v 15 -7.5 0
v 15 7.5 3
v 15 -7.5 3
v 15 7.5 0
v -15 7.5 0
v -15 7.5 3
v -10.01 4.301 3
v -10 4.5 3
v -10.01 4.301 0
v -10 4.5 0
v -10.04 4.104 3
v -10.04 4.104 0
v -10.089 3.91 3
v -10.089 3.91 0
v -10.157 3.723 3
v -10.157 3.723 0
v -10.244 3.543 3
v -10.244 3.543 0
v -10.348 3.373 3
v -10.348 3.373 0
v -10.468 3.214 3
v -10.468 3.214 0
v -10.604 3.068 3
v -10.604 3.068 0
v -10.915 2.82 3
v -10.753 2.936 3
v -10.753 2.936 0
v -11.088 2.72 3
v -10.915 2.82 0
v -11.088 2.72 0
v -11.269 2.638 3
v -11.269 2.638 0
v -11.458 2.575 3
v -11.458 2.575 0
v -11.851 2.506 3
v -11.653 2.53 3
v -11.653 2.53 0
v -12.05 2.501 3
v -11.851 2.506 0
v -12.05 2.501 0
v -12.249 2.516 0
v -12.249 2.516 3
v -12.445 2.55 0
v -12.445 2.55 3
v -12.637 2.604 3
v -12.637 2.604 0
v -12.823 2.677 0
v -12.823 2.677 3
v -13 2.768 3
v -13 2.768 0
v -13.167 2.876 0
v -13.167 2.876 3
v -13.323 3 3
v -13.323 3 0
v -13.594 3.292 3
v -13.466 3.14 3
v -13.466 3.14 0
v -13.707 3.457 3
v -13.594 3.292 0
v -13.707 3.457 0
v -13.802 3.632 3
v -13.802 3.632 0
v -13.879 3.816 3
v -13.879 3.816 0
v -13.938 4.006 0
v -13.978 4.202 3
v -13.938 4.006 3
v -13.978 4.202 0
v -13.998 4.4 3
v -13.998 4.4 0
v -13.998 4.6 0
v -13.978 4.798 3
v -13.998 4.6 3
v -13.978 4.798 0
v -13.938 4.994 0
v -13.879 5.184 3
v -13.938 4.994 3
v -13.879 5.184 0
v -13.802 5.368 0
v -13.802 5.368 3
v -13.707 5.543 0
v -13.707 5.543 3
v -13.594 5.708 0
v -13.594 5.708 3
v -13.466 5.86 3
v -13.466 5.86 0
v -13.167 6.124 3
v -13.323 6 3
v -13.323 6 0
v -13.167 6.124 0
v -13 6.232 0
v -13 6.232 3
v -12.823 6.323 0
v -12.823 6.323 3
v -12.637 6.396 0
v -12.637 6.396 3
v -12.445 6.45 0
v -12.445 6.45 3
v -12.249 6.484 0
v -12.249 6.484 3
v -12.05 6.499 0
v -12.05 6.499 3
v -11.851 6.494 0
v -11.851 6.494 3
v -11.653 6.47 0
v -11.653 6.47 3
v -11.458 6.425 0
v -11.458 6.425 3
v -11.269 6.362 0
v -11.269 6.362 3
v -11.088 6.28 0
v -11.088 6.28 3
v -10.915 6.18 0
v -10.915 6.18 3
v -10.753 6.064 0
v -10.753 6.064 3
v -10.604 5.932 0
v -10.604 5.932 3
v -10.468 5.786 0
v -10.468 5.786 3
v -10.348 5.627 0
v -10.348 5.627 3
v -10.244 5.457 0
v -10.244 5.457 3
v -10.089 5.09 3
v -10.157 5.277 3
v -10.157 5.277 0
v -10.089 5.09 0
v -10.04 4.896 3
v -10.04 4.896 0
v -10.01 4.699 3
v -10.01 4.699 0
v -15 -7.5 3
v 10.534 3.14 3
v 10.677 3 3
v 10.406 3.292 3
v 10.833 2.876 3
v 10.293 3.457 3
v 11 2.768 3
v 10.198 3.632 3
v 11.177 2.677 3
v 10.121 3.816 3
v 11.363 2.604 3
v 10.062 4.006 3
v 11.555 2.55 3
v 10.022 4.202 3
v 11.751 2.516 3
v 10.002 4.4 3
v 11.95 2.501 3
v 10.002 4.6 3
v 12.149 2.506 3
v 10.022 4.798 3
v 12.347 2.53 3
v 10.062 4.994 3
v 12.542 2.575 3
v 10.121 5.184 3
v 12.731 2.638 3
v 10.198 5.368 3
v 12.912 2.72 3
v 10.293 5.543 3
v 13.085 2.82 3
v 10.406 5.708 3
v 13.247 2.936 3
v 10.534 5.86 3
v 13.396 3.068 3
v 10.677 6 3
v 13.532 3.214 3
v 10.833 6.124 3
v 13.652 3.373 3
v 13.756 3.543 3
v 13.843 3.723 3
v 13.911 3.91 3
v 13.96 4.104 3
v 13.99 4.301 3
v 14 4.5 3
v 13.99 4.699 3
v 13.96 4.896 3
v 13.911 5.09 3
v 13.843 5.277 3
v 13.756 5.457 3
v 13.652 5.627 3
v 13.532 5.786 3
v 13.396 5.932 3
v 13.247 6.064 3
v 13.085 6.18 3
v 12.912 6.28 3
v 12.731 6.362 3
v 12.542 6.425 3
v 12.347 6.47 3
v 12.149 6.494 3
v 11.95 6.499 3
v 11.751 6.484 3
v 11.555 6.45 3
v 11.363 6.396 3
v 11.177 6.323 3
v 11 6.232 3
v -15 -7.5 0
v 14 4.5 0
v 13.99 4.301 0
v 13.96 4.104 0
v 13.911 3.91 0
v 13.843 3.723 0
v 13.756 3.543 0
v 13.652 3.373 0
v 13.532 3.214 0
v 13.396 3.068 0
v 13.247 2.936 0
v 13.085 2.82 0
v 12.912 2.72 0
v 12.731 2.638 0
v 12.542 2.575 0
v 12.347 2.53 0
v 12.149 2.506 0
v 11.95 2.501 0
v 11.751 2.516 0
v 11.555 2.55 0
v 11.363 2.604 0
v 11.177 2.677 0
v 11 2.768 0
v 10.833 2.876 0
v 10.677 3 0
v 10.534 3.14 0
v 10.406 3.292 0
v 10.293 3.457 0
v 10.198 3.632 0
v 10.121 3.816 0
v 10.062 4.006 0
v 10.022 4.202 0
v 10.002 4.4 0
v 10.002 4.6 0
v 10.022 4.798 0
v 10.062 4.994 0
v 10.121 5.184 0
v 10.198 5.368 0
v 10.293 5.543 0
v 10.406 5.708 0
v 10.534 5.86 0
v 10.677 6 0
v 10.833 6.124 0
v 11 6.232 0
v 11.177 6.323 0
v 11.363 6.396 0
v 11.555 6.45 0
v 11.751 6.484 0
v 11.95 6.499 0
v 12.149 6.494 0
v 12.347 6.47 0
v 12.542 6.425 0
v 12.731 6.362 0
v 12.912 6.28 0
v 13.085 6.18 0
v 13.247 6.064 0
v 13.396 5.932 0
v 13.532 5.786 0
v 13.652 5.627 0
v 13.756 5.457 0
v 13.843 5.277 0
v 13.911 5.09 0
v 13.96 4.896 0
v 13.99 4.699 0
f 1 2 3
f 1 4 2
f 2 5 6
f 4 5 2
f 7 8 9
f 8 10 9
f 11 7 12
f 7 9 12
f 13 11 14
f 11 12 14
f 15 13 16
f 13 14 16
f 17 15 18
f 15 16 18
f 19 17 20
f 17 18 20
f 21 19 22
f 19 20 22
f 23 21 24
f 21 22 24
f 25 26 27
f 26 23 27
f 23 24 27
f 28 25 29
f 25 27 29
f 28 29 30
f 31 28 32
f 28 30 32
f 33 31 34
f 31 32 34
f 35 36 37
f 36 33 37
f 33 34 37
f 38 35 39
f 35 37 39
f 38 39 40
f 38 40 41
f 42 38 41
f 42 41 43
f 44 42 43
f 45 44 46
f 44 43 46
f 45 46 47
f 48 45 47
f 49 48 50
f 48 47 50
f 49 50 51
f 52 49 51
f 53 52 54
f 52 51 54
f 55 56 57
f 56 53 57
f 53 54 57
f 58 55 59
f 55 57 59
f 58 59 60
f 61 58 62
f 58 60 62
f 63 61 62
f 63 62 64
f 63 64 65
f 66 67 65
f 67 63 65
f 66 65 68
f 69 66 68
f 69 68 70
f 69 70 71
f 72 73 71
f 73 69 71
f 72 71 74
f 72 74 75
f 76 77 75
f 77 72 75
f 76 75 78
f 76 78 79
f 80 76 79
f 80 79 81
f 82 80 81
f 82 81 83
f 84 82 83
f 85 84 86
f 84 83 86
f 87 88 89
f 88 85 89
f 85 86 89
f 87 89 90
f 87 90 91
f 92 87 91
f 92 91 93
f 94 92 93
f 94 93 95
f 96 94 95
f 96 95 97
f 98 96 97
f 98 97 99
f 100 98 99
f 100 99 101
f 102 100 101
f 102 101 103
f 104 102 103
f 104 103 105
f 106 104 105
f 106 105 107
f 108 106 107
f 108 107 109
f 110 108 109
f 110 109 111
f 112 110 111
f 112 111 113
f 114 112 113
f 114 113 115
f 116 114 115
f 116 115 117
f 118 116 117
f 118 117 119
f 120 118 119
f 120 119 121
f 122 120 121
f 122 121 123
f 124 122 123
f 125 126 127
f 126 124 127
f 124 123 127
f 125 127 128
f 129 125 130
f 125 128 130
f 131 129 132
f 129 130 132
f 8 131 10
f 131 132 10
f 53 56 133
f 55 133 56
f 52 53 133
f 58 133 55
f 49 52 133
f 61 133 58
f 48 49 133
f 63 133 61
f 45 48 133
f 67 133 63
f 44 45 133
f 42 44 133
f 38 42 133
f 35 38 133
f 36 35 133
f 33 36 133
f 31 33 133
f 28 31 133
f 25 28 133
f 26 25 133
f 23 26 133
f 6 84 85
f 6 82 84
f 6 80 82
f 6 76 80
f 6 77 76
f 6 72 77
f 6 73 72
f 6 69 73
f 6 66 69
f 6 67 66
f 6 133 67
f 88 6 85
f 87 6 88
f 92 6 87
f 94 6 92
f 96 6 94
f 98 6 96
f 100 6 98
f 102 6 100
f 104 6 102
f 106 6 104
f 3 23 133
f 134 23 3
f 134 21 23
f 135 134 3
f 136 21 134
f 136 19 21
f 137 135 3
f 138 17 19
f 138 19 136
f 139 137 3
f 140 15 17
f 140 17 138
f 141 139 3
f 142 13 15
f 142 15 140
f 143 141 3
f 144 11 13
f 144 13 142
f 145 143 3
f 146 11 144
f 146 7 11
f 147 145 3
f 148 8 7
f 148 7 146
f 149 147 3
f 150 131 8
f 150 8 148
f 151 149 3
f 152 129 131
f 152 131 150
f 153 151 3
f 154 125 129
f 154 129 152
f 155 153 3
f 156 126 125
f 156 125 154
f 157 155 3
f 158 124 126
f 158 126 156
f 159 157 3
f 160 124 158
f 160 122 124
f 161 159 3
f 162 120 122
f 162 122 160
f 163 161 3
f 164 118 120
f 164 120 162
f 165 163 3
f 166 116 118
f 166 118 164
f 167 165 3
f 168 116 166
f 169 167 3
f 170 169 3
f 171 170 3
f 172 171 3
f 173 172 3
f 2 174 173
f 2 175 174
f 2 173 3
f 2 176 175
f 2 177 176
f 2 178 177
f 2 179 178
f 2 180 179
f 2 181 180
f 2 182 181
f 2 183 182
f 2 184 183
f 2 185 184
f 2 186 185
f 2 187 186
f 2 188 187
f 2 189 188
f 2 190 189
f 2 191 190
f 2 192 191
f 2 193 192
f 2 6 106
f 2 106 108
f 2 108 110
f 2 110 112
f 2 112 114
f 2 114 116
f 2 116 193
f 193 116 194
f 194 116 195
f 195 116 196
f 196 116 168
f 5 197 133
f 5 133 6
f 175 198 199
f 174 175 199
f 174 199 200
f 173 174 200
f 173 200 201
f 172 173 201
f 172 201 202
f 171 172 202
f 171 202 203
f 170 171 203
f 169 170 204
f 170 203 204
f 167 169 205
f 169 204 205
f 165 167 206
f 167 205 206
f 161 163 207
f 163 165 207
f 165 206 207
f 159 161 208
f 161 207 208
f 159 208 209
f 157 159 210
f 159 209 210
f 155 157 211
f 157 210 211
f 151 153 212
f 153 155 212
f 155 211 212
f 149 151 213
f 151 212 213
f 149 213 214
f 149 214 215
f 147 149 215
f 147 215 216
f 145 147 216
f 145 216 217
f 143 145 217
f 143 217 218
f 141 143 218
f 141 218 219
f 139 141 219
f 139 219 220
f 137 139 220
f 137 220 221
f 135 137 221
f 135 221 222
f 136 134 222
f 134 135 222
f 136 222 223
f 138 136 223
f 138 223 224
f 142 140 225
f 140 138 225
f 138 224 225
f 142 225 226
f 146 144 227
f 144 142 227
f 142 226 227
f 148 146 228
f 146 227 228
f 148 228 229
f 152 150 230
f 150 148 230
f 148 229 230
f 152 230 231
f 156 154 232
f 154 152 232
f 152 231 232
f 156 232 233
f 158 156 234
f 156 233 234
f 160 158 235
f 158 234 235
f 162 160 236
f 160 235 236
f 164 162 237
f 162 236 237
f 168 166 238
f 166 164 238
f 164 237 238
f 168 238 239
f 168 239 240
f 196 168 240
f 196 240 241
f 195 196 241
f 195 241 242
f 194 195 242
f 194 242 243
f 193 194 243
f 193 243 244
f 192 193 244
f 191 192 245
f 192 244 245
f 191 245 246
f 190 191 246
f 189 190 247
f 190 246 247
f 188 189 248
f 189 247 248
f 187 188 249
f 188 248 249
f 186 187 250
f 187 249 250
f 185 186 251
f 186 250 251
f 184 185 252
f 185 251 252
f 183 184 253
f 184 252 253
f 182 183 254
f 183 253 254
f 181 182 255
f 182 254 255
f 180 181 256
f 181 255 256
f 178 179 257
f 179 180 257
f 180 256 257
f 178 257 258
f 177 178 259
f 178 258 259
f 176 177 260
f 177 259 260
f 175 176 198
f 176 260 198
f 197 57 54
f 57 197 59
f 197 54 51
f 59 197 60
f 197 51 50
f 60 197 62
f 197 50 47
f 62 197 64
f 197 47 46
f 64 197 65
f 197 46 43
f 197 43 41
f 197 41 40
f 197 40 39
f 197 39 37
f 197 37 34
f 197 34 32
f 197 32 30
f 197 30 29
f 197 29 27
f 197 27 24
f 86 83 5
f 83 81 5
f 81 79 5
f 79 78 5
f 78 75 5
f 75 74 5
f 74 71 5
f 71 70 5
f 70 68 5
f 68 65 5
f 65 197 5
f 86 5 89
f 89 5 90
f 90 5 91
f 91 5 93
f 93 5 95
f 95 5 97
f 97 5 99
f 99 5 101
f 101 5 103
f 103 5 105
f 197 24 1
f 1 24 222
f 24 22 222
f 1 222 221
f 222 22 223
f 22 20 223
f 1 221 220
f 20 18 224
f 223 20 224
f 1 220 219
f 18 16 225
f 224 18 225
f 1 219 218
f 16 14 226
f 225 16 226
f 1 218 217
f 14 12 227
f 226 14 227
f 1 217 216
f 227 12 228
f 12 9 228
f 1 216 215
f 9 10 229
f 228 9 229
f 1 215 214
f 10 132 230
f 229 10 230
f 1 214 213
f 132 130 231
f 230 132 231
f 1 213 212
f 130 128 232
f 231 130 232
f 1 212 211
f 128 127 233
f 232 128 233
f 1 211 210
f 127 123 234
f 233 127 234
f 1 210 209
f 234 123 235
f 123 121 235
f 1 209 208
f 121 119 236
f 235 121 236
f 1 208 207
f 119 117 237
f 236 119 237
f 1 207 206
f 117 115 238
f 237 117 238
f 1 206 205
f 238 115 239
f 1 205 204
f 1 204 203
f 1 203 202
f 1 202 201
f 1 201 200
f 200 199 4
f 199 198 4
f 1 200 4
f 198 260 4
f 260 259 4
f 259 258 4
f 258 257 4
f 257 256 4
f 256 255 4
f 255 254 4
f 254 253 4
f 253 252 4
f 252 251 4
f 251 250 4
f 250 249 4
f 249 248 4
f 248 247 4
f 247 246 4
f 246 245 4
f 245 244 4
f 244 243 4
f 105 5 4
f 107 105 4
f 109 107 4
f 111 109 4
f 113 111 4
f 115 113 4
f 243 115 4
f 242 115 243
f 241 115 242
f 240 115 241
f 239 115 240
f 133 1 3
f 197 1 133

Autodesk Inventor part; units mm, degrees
ref_plane "YZ Plane" through (0, 0, 0) normal (1, 0, 0) x (0, 1, 0)
ref_plane "XZ Plane" through (0, 0, 0) normal (0, 1, 0) x (-1, 0, 0)
ref_plane "XY Plane" through (0, 0, 0) normal (0, 0, 1) x (1, 0, 0)
sketch "Sketch1" plane through (0, 0, 0) normal (0, 0, 1) x (1, 0, 0)
  line L0 (-15, 7.5) -> (15, 7.5)
  line L1 (15, 7.5) -> (15, -7.5)
  line L2 (15, -7.5) -> (-15, -7.5)
  line L3 (-15, -7.5) -> (-15, 7.5)
  line L4 (-15, 7.5) -> (15, -7.5) construction
  line L5 (15, 7.5) -> (-15, -7.5) construction
  circle A0 centre (-12, 4.5) radius 2
  line L6 (0, -7.5) -> (0, 7.5)
  circle A1 centre (12, 4.5) radius 2
  point P0 (0, 0)
  dimension "d0" = 4
  dimension "d1" = 3
  dimension "d2" = 3
  dimension "d3" = 30
  dimension "d4" = 15
  dimension "d5" = 24
extrude "Extrusion1" add sketch "Sketch1" along normal blind 3
properties part number "imu_holder"
